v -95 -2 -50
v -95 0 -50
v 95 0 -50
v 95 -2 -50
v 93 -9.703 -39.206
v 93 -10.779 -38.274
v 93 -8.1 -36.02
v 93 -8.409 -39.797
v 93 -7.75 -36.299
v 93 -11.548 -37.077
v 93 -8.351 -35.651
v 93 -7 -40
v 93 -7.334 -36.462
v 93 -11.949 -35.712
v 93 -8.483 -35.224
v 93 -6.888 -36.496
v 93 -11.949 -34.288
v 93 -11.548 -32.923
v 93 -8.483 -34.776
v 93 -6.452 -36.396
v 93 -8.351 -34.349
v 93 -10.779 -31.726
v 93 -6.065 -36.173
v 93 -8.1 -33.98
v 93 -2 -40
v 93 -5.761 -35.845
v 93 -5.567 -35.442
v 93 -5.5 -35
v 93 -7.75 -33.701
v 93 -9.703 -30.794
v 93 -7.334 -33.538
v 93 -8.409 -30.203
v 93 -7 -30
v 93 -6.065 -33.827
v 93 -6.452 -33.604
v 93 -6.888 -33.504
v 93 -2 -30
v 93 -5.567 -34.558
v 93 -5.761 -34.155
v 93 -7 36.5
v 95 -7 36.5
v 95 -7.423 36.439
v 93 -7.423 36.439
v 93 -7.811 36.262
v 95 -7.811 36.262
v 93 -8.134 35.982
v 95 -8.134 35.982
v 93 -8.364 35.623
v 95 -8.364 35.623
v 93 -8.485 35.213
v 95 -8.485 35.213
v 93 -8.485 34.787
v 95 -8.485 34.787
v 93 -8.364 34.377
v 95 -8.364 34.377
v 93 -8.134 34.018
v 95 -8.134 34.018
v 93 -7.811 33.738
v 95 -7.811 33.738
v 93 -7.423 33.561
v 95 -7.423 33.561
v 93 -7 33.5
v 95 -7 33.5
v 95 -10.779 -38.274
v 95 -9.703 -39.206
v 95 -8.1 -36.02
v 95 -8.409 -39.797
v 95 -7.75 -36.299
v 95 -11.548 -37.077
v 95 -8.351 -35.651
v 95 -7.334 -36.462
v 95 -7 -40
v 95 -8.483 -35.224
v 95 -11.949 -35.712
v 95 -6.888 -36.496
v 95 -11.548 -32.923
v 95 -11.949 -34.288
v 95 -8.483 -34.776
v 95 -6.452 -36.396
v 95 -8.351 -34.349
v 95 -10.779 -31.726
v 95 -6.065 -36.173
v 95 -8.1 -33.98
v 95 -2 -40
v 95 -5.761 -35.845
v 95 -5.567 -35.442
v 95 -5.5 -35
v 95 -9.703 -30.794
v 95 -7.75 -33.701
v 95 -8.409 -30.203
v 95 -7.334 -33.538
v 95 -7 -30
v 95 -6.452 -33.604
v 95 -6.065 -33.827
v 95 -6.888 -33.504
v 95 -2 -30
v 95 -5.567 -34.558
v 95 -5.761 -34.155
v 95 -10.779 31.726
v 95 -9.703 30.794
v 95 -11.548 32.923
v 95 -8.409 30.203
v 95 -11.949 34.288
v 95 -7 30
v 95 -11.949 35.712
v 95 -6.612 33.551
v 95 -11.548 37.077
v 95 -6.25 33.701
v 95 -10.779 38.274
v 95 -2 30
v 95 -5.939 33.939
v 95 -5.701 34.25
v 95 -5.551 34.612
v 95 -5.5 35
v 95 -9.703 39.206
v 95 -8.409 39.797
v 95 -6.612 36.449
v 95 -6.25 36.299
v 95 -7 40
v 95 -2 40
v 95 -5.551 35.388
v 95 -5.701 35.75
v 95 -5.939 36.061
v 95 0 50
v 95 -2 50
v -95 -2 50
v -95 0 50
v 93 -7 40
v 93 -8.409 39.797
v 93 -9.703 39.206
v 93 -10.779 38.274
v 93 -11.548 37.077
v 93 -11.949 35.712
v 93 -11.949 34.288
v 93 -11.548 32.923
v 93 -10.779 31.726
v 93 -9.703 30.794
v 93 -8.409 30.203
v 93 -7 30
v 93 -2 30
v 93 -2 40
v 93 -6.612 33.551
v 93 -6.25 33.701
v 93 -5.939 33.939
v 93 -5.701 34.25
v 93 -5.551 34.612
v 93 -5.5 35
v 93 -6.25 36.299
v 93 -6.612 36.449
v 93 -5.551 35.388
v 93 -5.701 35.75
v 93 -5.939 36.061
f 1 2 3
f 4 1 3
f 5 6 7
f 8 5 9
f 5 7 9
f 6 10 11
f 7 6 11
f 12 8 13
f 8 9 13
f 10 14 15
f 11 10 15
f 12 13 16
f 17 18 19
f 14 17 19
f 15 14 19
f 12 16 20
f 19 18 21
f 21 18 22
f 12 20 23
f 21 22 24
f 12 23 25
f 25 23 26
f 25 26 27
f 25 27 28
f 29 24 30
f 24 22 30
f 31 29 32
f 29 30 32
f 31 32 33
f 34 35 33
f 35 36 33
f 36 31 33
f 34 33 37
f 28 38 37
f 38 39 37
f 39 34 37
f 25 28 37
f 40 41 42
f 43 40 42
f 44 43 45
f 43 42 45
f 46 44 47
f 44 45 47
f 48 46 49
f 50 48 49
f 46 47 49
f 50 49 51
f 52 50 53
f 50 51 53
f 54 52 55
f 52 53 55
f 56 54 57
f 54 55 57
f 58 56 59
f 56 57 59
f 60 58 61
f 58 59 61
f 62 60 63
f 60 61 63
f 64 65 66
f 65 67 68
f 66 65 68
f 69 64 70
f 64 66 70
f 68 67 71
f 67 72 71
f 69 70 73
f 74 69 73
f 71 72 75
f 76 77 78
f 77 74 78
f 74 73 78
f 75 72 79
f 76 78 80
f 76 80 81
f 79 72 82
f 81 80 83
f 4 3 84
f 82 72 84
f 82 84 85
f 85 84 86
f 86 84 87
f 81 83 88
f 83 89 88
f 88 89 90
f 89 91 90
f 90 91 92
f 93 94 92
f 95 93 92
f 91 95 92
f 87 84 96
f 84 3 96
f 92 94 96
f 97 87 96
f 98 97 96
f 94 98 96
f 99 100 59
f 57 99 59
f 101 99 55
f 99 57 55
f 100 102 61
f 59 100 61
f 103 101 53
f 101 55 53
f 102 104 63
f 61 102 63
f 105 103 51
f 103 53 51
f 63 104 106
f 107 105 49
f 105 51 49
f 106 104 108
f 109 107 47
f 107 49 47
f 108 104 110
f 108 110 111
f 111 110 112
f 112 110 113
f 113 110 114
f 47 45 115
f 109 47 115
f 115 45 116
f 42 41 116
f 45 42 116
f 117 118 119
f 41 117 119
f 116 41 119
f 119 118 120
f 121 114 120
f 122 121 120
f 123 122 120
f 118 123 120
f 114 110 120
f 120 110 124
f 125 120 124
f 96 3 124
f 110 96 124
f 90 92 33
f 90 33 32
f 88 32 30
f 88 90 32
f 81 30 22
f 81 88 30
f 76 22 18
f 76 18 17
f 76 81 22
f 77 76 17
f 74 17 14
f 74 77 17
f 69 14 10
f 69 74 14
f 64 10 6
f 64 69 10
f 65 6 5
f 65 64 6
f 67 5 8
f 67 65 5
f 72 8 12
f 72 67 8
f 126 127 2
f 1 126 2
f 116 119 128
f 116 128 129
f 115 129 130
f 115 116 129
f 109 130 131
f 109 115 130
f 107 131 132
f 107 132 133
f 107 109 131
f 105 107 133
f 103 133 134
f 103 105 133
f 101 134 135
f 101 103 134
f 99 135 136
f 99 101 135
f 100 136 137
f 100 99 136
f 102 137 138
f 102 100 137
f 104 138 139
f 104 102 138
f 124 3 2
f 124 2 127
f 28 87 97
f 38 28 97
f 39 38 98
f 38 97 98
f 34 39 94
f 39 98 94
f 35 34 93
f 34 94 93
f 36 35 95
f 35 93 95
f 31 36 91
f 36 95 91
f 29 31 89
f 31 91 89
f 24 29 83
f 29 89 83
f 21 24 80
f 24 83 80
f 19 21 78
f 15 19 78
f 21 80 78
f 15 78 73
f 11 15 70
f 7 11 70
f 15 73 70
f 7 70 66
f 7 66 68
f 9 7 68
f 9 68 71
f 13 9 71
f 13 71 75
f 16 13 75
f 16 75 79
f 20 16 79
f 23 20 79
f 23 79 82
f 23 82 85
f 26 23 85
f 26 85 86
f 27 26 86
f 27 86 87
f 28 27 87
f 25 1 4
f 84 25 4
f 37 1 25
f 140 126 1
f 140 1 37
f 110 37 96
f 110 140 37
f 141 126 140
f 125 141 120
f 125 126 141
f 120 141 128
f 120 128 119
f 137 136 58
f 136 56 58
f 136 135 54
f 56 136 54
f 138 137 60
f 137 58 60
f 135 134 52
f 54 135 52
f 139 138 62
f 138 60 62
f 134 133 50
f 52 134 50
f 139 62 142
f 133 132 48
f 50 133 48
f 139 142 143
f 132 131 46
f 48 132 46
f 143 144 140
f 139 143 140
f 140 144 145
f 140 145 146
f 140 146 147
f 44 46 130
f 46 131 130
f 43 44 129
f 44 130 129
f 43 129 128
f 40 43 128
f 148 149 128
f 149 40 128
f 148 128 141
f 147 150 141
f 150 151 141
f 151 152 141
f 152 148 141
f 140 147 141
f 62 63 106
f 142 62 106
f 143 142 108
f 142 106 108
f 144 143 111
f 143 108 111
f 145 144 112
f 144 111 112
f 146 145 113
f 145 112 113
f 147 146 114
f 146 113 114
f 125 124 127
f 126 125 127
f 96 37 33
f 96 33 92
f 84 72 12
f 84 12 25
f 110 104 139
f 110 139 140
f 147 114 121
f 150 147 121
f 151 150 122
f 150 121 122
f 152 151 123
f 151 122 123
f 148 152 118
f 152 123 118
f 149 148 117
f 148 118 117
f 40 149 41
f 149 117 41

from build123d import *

# Parameters (mm, degrees)
F1_DEPTH = 2
F0_W     = 1
F0_H     = 10
F2_DEPTH = 7
F3_R     = 1.5
F4_DEPTH = 2
F5_DEPTH = 25


with BuildPart() as f1:
    # F0 (on Front) → F1 (new body)
    with BuildSketch(Plane.XZ):
        Polygon((-95, -50), (95, -50), (95, -40), (94, -40), (94, -30), (95, -30), (95, 30), (94, 30), (94, 40), (95, 40), (95, 50), (-95, 50), align=None)
    extrude(amount=F1_DEPTH)



with BuildPart() as f2:
    # F0 (on Front) → F2 (new body)
    with BuildSketch(Plane.XZ):
        with Locations((94.5, 35)):
            Rectangle(F0_W, F0_H)
    extrude(amount=F2_DEPTH)


with BuildPart() as f2b:
    # F0 (on Front) → F2, piece 2 (new body)
    with BuildSketch(Plane.XZ):
        with Locations((94.5, -35)):
            Rectangle(F0_W, F0_H)
    extrude(amount=F2_DEPTH)


with BuildPart() as f1_1:
    add(f1.part)

    add(f2.part)  # F4 merges F2

    add(f2b.part)  # F4 merges F2b
    # F3 (on face) → F4 (join)
    with BuildSketch(Plane.YZ.offset(95)):
        with BuildLine():
            Line((0, -30), (-7, -30))
            ThreePointArc((-7, -30), (-12, -35), (-7, -40))
            Line((-7, -40), (0, -40))
            Line((0, -40), (0, -30))
        make_face()
        with Locations((-7, -35)):
            Circle(F3_R, mode=Mode.SUBTRACT)
        with BuildLine():
            Line((0, 40), (-7, 40))
            Line((-7, 40), (-7, 36.5))
            ThreePointArc((-7, 36.5), (-5.9393398282, 36.0606601718), (-5.5, 35))
            ThreePointArc((-5.5, 35), (-5.9393398282, 33.9393398282), (-7, 33.5))
            Line((-7, 33.5), (-7, 30))
            Line((-7, 30), (0, 30))
            Line((0, 30), (0, 40))
        make_face()
        with Locations((-7, -35)):
            Circle(F3_R)
        with BuildLine():
            Line((-7, 36.5), (-7, 40))
            ThreePointArc((-7, 40), (-12, 35), (-7, 30))
            Line((-7, 30), (-7, 33.5))
            ThreePointArc((-7, 33.5), (-8.5, 35), (-7, 36.5))
        make_face()
        with BuildLine():
            ThreePointArc((-5.5, 35), (-5.9393398282, 36.0606601718), (-7, 36.5))
            Line((-7, 36.5), (-7, 33.5))
            ThreePointArc((-7, 33.5), (-5.9393398282, 33.9393398282), (-5.5, 35))
        make_face()
        with BuildLine():
            Line((-7, 33.5), (-7, 36.5))
            ThreePointArc((-7, 36.5), (-8.5, 35), (-7, 33.5))
        make_face()
    extrude(amount=-F4_DEPTH)

    # F3 (on face) → F5 (cut)
    with BuildSketch(Plane.YZ.offset(95)):
        with Locations((-7, -35)):
            Circle(F3_R)
        with BuildLine():
            Line((-7, 33.5), (-7, 36.5))
            ThreePointArc((-7, 36.5), (-8.5, 35), (-7, 33.5))
        make_face()
        with BuildLine():
            ThreePointArc((-5.5, 35), (-5.9393398282, 36.0606601718), (-7, 36.5))
            Line((-7, 36.5), (-7, 33.5))
            ThreePointArc((-7, 33.5), (-5.9393398282, 33.9393398282), (-5.5, 35))
        make_face()
    extrude(amount=-F5_DEPTH, mode=Mode.SUBTRACT)


solid = f1_1.part
